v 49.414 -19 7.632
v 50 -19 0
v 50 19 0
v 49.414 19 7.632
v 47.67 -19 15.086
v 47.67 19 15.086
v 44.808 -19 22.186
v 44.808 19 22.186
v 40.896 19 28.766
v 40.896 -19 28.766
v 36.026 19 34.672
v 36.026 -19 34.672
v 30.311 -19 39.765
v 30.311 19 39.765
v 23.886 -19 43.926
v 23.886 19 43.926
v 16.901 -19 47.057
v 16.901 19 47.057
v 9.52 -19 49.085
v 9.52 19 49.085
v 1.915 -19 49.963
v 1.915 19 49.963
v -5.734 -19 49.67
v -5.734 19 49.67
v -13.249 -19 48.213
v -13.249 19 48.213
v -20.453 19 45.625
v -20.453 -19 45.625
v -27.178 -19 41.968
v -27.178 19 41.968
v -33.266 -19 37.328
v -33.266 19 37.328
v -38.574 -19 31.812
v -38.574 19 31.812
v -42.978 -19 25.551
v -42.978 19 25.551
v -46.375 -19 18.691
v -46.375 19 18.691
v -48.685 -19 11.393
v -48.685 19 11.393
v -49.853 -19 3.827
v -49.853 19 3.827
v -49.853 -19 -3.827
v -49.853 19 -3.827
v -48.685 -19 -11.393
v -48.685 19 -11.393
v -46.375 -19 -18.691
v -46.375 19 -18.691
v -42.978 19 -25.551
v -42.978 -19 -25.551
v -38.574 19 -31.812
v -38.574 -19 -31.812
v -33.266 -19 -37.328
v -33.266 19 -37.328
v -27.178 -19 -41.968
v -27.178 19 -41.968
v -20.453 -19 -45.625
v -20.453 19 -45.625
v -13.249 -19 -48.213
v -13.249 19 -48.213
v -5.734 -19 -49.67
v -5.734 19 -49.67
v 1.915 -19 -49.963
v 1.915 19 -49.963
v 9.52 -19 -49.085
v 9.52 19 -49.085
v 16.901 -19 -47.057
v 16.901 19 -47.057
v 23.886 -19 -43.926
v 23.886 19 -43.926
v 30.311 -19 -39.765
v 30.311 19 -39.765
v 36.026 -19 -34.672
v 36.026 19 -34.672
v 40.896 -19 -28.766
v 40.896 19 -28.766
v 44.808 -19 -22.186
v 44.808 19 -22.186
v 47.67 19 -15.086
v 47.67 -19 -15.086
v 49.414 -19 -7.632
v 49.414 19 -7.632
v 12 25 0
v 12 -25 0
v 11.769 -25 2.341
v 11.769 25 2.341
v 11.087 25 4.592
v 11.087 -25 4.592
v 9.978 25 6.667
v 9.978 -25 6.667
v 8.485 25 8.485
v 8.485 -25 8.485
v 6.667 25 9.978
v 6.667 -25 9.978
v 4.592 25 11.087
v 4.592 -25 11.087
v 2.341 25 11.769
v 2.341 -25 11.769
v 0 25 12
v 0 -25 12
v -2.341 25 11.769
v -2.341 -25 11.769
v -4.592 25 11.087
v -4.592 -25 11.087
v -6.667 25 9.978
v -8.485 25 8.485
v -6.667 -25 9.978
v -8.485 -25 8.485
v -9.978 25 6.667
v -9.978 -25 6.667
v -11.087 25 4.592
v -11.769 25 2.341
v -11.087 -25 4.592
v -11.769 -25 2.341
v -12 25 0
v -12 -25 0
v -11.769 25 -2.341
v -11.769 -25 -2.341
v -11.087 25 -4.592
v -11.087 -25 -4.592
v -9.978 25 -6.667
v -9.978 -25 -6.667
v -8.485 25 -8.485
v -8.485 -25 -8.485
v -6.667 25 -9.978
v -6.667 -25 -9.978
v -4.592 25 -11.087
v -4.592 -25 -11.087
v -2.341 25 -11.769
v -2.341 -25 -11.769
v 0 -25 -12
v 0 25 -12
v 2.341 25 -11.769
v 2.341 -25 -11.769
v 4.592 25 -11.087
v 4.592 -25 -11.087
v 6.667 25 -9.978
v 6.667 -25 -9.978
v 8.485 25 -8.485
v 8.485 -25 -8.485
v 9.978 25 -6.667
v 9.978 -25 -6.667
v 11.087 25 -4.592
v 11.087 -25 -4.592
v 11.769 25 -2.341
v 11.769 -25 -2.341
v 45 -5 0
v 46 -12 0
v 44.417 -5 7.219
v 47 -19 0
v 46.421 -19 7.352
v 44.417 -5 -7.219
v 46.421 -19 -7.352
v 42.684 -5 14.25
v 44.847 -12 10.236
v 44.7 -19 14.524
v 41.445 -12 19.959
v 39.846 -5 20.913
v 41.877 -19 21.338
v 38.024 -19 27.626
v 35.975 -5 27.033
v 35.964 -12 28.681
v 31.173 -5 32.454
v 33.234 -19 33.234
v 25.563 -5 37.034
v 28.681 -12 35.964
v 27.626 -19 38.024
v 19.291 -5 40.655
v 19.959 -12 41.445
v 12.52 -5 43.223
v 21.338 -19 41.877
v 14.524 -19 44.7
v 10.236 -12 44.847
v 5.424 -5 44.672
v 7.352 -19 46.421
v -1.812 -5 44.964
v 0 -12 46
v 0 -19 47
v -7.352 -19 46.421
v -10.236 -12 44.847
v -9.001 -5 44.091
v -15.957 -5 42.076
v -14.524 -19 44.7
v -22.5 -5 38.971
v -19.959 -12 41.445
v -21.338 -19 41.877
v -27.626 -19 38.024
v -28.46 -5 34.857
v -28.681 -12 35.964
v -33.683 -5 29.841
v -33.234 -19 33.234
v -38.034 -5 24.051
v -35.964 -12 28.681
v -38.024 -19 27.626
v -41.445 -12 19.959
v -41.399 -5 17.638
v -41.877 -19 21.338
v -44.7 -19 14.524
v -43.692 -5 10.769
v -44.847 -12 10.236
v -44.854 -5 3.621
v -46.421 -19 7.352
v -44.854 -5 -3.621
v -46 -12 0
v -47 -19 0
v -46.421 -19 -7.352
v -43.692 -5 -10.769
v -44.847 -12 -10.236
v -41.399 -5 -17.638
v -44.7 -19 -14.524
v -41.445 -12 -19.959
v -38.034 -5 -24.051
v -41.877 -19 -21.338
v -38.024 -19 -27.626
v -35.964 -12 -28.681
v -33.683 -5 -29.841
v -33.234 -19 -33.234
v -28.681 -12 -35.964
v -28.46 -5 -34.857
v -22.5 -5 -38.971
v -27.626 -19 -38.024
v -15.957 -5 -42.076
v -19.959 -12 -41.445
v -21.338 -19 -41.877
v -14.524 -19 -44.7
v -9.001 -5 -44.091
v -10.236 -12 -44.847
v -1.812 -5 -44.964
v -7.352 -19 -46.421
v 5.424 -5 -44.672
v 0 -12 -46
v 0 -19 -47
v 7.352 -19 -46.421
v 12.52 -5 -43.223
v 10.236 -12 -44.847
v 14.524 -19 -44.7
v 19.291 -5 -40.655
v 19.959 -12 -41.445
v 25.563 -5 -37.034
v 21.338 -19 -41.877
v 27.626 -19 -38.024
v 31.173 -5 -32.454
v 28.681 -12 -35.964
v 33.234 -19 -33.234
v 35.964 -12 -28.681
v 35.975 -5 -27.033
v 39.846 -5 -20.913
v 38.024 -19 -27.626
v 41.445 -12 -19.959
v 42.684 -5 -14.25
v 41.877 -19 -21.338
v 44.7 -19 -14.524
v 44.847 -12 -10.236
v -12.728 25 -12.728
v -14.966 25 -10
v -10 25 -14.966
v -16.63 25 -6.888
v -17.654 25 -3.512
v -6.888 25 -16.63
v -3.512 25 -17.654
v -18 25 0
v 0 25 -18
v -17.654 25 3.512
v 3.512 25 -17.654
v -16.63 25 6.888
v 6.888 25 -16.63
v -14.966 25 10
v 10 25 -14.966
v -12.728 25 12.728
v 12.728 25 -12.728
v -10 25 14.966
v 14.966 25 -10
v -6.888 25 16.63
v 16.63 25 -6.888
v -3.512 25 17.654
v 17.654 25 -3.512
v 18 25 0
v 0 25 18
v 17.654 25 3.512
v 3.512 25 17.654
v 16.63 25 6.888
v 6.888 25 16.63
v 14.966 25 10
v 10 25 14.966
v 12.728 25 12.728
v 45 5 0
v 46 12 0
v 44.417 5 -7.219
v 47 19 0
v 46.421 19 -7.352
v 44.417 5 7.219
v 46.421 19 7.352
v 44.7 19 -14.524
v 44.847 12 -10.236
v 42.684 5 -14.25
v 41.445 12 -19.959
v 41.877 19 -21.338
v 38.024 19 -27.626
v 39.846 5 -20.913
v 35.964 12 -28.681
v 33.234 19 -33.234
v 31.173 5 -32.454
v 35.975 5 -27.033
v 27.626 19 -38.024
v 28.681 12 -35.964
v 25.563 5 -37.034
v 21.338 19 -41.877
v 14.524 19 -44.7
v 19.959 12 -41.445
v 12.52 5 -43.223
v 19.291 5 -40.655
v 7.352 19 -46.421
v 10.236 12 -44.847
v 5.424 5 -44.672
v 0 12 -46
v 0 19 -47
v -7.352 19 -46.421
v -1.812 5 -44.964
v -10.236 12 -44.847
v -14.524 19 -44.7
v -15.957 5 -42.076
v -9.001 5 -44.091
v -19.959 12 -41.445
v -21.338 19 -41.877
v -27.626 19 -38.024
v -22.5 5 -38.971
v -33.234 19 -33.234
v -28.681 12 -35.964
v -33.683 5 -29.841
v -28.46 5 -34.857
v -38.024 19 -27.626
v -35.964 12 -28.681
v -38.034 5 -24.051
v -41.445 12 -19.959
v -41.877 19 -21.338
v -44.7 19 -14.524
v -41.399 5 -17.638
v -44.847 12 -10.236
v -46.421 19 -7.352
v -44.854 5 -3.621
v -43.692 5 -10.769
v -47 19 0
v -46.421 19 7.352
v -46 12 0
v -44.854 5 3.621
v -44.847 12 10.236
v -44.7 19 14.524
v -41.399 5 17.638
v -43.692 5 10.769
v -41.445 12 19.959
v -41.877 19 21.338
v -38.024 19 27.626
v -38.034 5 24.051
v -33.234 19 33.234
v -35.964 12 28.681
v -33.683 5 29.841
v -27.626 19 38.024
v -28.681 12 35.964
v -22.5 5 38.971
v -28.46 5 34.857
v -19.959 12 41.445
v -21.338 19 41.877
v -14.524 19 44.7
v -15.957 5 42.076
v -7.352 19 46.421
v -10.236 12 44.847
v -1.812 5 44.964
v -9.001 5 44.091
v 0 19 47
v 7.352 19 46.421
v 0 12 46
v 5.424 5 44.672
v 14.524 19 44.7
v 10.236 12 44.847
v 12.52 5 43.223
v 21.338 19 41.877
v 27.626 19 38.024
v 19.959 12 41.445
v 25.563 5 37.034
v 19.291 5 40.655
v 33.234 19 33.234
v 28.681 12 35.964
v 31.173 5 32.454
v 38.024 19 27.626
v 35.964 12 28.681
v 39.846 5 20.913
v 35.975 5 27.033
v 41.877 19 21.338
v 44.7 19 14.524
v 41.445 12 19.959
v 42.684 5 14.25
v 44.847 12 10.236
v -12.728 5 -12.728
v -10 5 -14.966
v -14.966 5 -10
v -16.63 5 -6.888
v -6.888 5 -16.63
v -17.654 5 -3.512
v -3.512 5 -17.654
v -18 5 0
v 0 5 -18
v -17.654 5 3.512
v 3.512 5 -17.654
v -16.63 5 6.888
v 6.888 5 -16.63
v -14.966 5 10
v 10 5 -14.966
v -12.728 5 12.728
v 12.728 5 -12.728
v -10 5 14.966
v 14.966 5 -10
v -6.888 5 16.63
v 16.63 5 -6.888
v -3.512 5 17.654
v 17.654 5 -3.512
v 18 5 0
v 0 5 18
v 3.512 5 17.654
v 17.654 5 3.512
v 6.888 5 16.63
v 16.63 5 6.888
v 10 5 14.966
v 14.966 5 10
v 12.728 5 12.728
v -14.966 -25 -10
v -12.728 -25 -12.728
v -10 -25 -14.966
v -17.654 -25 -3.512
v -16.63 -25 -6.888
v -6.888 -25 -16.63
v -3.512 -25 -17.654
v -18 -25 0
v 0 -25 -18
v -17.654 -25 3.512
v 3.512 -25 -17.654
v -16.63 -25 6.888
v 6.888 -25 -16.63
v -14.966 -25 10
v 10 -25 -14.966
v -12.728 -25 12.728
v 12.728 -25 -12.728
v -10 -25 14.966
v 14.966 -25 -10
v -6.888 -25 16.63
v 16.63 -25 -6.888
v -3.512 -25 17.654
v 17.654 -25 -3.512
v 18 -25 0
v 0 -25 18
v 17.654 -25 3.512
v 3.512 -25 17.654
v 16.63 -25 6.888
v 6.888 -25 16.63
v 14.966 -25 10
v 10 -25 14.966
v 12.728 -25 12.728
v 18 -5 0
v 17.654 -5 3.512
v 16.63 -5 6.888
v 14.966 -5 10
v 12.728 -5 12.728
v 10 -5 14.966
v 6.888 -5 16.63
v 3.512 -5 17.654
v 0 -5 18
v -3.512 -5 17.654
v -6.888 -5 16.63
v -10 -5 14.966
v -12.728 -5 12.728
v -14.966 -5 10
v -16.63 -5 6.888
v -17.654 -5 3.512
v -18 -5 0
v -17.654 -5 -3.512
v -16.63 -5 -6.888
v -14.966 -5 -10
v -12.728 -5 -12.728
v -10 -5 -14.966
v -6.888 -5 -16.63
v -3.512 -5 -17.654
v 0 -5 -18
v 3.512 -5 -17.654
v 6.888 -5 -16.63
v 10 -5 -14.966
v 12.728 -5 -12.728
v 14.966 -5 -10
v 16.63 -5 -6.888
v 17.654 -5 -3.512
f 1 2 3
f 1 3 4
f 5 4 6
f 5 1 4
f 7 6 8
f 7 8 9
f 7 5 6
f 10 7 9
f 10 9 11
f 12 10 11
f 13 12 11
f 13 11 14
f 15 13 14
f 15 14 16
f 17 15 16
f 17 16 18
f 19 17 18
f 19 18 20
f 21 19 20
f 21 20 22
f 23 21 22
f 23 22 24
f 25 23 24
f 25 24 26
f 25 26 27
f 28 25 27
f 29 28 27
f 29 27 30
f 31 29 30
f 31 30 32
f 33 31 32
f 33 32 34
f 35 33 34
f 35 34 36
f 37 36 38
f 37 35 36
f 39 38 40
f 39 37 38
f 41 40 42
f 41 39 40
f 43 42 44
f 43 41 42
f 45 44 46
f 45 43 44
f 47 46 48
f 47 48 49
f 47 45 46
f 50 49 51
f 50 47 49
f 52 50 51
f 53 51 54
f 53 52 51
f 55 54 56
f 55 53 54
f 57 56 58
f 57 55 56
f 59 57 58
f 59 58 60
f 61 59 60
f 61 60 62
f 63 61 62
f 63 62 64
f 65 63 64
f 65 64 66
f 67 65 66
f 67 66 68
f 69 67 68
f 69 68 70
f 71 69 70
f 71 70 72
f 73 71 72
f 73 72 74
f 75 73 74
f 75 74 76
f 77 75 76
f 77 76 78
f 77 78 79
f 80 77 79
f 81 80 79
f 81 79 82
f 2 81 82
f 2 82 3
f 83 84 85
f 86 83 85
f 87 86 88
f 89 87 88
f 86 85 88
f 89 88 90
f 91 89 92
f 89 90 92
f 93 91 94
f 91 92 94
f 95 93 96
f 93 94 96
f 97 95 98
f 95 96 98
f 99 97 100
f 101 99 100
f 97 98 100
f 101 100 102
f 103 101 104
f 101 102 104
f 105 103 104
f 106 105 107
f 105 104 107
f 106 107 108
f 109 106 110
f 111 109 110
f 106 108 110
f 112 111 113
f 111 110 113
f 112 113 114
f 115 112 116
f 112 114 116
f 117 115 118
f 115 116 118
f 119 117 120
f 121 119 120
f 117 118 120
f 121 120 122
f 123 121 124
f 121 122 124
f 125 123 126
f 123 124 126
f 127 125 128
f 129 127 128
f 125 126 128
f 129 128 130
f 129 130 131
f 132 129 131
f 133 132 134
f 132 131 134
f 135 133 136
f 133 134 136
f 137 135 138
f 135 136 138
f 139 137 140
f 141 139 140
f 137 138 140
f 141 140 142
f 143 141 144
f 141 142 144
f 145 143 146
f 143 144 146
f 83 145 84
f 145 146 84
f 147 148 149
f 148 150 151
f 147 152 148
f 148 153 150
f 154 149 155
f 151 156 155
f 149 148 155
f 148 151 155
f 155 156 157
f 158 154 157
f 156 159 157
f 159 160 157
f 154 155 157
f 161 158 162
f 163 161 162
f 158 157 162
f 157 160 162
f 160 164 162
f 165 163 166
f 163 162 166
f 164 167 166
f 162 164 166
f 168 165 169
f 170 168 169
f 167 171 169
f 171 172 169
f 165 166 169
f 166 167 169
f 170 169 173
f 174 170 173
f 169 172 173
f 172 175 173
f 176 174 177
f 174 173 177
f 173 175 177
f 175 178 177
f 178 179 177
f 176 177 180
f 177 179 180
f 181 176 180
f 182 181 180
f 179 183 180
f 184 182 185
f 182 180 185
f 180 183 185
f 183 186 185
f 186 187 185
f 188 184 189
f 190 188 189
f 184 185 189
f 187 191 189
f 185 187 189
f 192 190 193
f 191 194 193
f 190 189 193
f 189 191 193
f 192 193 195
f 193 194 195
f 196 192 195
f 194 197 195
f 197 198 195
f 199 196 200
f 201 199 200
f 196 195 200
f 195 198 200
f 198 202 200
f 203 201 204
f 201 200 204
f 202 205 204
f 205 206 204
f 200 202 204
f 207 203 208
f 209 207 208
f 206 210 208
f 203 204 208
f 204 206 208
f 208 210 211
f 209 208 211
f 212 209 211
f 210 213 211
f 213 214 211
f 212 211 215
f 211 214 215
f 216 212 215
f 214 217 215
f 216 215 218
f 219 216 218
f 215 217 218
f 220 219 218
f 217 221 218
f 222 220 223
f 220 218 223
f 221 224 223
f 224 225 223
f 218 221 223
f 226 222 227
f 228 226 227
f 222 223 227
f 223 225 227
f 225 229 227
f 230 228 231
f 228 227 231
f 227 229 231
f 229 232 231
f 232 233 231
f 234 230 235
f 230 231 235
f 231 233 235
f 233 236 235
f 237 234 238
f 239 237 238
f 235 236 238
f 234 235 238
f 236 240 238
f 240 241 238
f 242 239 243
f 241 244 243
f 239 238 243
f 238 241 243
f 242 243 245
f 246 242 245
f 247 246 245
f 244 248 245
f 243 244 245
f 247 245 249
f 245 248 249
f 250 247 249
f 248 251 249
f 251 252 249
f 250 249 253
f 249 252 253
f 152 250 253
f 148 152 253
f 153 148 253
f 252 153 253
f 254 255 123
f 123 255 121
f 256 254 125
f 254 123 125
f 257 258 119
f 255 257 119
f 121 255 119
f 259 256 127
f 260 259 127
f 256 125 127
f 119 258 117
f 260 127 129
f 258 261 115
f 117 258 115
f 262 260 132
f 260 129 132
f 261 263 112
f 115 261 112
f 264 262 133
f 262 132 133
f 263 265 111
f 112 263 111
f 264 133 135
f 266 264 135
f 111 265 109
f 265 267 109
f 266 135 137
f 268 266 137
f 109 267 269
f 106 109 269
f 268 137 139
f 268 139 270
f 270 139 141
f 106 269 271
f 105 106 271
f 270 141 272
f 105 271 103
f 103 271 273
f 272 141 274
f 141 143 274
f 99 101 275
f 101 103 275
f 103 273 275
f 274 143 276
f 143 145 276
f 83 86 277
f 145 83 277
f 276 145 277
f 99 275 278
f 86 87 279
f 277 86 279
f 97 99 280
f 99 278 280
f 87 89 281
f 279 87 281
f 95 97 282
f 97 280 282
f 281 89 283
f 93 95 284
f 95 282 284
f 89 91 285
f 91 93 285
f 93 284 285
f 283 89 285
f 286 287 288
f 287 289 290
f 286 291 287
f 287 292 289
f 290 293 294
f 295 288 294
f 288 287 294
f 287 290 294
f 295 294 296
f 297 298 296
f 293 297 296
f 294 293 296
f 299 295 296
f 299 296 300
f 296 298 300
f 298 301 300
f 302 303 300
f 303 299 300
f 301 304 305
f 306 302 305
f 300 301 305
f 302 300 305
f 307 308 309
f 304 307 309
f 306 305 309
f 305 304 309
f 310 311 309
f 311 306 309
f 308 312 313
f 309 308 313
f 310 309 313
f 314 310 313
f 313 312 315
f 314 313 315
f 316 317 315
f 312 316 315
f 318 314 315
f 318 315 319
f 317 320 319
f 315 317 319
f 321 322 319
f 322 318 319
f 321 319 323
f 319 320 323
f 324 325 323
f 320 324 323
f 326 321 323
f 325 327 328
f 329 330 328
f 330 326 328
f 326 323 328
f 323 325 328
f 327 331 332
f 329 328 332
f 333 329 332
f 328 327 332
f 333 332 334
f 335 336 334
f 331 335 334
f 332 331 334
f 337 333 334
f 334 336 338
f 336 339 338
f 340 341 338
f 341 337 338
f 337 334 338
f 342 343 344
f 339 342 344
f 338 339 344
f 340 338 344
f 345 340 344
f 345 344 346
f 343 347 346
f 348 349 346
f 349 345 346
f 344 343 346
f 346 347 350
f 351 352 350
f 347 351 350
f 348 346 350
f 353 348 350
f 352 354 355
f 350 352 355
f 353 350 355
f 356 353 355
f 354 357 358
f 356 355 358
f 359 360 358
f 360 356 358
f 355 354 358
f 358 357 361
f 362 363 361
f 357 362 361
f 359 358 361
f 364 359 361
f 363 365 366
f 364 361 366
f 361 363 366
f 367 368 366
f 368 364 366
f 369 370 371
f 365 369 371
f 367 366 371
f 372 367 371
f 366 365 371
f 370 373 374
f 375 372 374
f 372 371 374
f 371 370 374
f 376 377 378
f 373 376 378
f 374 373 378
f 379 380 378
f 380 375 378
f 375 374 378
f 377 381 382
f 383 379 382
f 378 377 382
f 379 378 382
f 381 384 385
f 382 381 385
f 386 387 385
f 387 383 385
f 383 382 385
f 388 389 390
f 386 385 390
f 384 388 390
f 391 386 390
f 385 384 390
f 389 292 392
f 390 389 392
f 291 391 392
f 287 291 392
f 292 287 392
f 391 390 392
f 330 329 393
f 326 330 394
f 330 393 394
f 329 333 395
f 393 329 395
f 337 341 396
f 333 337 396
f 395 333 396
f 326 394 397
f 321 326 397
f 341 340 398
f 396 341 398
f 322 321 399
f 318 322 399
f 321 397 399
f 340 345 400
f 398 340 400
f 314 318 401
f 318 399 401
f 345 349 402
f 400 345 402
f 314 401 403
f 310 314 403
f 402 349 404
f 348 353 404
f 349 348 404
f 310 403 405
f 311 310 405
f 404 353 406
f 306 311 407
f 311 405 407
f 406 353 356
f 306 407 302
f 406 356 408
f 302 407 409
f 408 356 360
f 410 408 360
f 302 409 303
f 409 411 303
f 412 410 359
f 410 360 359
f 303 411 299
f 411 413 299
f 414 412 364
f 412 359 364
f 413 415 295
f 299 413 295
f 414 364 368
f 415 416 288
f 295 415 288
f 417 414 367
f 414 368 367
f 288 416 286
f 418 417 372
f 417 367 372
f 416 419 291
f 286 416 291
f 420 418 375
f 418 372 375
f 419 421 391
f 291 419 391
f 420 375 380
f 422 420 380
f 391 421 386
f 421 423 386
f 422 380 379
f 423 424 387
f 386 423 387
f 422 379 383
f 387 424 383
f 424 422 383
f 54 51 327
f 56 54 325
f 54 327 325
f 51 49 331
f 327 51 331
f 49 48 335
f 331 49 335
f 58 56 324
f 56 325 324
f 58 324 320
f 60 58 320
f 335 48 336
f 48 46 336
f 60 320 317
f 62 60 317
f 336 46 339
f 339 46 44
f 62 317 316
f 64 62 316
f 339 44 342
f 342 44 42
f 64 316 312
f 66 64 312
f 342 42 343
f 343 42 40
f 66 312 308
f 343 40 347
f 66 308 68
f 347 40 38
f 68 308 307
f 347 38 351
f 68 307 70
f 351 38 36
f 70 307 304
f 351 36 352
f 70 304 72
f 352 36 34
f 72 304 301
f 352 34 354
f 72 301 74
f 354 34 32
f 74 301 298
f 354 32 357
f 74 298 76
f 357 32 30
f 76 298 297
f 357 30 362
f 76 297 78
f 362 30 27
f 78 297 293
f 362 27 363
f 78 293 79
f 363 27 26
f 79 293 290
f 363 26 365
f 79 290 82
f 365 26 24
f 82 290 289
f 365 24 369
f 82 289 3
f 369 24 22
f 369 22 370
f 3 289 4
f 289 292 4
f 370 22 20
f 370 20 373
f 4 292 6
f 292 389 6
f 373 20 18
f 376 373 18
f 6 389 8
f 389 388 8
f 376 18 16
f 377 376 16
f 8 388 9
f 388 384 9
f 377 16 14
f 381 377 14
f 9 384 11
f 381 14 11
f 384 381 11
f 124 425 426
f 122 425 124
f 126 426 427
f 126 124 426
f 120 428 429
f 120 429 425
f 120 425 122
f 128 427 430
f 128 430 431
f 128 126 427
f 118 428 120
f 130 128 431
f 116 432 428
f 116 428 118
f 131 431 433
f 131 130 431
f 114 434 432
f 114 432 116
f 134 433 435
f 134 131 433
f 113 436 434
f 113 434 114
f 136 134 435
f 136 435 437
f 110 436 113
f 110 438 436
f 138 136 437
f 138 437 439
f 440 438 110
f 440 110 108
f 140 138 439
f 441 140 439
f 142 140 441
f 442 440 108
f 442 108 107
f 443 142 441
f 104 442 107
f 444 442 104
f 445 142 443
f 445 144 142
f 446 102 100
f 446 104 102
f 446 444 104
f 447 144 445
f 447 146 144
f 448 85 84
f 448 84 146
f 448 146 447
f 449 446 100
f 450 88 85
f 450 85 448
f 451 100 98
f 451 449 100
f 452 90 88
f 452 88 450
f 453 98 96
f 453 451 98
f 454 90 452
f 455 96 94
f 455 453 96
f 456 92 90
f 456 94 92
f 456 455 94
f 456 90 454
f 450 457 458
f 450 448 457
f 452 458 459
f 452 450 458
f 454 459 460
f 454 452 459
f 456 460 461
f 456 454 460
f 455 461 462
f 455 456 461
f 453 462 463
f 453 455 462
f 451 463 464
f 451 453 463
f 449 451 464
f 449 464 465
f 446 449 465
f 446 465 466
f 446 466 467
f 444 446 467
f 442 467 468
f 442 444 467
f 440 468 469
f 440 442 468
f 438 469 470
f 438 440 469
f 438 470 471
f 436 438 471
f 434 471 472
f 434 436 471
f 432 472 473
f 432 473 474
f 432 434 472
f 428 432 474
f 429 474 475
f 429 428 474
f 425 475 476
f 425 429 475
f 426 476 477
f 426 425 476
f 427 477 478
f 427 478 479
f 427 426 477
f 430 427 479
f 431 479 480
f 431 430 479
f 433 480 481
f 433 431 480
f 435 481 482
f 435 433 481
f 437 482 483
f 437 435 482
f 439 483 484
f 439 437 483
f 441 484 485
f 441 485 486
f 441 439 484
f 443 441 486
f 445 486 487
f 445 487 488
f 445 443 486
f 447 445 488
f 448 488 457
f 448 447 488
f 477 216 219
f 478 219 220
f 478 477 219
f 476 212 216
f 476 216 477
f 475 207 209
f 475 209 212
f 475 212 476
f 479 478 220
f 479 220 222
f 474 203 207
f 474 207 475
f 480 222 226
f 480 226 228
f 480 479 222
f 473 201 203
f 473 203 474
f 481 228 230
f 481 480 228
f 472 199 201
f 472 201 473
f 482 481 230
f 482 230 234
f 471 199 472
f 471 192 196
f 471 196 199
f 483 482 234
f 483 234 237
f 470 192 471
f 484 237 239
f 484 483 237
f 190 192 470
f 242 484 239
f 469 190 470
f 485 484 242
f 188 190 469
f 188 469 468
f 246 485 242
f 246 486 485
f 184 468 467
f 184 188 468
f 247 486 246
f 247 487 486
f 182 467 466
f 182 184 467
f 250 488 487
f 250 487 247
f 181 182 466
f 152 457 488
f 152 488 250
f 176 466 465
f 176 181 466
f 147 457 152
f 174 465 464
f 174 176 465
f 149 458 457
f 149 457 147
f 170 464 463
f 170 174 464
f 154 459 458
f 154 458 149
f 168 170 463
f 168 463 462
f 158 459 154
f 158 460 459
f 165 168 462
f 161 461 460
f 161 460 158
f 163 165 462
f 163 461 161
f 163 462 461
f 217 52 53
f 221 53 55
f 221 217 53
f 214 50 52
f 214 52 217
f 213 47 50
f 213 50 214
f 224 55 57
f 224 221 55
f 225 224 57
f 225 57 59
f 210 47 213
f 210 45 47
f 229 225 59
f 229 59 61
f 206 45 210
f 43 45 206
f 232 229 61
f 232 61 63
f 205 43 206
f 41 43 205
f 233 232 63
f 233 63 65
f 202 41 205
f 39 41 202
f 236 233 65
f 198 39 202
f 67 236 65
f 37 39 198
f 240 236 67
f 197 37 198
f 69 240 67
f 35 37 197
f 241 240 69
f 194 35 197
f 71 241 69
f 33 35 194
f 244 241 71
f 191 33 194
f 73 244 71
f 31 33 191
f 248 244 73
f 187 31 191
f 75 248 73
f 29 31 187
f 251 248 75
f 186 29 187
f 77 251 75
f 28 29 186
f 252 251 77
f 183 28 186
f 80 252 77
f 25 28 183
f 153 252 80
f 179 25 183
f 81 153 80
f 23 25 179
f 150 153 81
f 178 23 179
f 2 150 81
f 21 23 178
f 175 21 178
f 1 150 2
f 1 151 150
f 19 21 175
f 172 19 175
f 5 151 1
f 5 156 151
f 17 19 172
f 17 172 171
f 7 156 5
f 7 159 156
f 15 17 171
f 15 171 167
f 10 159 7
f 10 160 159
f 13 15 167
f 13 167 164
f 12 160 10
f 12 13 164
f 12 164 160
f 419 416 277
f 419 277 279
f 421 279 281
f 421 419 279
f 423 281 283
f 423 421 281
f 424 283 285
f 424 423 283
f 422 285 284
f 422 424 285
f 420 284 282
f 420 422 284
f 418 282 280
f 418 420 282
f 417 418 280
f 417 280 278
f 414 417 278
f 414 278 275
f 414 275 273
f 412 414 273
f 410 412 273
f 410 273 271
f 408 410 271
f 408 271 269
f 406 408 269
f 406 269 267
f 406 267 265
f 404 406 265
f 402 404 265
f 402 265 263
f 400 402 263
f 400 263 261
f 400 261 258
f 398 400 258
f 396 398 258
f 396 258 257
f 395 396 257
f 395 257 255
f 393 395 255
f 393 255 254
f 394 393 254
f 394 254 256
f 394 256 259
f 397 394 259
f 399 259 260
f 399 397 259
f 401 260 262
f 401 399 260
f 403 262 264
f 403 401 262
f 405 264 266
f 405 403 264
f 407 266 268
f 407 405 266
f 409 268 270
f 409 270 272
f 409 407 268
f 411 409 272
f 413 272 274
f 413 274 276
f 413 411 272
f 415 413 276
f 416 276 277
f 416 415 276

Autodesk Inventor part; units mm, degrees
ref_plane "YZ Plane" through (0, 0, 0) normal (1, 0, 0) x (0, 1, 0)
ref_plane "XZ Plane" through (0, 0, 0) normal (0, 1, 0) x (-1, 0, 0)
ref_plane "XY Plane" through (0, 0, 0) normal (0, 0, 1) x (1, 0, 0)
sketch "Sketch1" plane through (0, 0, 0) normal (0, 0, 1) x (1, 0, 0)
  line L0 (0, 40) -> (0, -30) projected
  line L1 (8.2, 0) -> (61.4, 0) projected
  line L2 (12, 25) -> (12, -25)
  line L3 (12, 25) -> (18, 25)
  line L4 (18, 25) -> (18, 5)
  line L5 (18, 5) -> (45, 5)
  line L6 (47, 19) -> (50, 19)
  line L7 (50, 19) -> (50, -19)
  line L8 (50, -19) -> (47, -19)
  line L9 (47, -19) -> (45, -5)
  line L10 (45, -5) -> (18, -5)
  line L11 (18, -5) -> (18, -25)
  line L12 (18, -25) -> (12, -25)
  line L13 (45, 5) -> (47, 19)
  dimension "d0" = 50
  dimension "d1" = 24
  dimension "d2" = 36
  dimension "d3" = 100
  dimension "d4" = 3
  dimension "d5" = 10
  dimension "d6" = 5
  dimension "d7" = 38
revolve "Revolution1" add sketch "Sketch1" angle 360 about axis through (0, 0, 0) along (0, -1, 0)
properties part number "Wheel" material "Thermoplastic Resin"
